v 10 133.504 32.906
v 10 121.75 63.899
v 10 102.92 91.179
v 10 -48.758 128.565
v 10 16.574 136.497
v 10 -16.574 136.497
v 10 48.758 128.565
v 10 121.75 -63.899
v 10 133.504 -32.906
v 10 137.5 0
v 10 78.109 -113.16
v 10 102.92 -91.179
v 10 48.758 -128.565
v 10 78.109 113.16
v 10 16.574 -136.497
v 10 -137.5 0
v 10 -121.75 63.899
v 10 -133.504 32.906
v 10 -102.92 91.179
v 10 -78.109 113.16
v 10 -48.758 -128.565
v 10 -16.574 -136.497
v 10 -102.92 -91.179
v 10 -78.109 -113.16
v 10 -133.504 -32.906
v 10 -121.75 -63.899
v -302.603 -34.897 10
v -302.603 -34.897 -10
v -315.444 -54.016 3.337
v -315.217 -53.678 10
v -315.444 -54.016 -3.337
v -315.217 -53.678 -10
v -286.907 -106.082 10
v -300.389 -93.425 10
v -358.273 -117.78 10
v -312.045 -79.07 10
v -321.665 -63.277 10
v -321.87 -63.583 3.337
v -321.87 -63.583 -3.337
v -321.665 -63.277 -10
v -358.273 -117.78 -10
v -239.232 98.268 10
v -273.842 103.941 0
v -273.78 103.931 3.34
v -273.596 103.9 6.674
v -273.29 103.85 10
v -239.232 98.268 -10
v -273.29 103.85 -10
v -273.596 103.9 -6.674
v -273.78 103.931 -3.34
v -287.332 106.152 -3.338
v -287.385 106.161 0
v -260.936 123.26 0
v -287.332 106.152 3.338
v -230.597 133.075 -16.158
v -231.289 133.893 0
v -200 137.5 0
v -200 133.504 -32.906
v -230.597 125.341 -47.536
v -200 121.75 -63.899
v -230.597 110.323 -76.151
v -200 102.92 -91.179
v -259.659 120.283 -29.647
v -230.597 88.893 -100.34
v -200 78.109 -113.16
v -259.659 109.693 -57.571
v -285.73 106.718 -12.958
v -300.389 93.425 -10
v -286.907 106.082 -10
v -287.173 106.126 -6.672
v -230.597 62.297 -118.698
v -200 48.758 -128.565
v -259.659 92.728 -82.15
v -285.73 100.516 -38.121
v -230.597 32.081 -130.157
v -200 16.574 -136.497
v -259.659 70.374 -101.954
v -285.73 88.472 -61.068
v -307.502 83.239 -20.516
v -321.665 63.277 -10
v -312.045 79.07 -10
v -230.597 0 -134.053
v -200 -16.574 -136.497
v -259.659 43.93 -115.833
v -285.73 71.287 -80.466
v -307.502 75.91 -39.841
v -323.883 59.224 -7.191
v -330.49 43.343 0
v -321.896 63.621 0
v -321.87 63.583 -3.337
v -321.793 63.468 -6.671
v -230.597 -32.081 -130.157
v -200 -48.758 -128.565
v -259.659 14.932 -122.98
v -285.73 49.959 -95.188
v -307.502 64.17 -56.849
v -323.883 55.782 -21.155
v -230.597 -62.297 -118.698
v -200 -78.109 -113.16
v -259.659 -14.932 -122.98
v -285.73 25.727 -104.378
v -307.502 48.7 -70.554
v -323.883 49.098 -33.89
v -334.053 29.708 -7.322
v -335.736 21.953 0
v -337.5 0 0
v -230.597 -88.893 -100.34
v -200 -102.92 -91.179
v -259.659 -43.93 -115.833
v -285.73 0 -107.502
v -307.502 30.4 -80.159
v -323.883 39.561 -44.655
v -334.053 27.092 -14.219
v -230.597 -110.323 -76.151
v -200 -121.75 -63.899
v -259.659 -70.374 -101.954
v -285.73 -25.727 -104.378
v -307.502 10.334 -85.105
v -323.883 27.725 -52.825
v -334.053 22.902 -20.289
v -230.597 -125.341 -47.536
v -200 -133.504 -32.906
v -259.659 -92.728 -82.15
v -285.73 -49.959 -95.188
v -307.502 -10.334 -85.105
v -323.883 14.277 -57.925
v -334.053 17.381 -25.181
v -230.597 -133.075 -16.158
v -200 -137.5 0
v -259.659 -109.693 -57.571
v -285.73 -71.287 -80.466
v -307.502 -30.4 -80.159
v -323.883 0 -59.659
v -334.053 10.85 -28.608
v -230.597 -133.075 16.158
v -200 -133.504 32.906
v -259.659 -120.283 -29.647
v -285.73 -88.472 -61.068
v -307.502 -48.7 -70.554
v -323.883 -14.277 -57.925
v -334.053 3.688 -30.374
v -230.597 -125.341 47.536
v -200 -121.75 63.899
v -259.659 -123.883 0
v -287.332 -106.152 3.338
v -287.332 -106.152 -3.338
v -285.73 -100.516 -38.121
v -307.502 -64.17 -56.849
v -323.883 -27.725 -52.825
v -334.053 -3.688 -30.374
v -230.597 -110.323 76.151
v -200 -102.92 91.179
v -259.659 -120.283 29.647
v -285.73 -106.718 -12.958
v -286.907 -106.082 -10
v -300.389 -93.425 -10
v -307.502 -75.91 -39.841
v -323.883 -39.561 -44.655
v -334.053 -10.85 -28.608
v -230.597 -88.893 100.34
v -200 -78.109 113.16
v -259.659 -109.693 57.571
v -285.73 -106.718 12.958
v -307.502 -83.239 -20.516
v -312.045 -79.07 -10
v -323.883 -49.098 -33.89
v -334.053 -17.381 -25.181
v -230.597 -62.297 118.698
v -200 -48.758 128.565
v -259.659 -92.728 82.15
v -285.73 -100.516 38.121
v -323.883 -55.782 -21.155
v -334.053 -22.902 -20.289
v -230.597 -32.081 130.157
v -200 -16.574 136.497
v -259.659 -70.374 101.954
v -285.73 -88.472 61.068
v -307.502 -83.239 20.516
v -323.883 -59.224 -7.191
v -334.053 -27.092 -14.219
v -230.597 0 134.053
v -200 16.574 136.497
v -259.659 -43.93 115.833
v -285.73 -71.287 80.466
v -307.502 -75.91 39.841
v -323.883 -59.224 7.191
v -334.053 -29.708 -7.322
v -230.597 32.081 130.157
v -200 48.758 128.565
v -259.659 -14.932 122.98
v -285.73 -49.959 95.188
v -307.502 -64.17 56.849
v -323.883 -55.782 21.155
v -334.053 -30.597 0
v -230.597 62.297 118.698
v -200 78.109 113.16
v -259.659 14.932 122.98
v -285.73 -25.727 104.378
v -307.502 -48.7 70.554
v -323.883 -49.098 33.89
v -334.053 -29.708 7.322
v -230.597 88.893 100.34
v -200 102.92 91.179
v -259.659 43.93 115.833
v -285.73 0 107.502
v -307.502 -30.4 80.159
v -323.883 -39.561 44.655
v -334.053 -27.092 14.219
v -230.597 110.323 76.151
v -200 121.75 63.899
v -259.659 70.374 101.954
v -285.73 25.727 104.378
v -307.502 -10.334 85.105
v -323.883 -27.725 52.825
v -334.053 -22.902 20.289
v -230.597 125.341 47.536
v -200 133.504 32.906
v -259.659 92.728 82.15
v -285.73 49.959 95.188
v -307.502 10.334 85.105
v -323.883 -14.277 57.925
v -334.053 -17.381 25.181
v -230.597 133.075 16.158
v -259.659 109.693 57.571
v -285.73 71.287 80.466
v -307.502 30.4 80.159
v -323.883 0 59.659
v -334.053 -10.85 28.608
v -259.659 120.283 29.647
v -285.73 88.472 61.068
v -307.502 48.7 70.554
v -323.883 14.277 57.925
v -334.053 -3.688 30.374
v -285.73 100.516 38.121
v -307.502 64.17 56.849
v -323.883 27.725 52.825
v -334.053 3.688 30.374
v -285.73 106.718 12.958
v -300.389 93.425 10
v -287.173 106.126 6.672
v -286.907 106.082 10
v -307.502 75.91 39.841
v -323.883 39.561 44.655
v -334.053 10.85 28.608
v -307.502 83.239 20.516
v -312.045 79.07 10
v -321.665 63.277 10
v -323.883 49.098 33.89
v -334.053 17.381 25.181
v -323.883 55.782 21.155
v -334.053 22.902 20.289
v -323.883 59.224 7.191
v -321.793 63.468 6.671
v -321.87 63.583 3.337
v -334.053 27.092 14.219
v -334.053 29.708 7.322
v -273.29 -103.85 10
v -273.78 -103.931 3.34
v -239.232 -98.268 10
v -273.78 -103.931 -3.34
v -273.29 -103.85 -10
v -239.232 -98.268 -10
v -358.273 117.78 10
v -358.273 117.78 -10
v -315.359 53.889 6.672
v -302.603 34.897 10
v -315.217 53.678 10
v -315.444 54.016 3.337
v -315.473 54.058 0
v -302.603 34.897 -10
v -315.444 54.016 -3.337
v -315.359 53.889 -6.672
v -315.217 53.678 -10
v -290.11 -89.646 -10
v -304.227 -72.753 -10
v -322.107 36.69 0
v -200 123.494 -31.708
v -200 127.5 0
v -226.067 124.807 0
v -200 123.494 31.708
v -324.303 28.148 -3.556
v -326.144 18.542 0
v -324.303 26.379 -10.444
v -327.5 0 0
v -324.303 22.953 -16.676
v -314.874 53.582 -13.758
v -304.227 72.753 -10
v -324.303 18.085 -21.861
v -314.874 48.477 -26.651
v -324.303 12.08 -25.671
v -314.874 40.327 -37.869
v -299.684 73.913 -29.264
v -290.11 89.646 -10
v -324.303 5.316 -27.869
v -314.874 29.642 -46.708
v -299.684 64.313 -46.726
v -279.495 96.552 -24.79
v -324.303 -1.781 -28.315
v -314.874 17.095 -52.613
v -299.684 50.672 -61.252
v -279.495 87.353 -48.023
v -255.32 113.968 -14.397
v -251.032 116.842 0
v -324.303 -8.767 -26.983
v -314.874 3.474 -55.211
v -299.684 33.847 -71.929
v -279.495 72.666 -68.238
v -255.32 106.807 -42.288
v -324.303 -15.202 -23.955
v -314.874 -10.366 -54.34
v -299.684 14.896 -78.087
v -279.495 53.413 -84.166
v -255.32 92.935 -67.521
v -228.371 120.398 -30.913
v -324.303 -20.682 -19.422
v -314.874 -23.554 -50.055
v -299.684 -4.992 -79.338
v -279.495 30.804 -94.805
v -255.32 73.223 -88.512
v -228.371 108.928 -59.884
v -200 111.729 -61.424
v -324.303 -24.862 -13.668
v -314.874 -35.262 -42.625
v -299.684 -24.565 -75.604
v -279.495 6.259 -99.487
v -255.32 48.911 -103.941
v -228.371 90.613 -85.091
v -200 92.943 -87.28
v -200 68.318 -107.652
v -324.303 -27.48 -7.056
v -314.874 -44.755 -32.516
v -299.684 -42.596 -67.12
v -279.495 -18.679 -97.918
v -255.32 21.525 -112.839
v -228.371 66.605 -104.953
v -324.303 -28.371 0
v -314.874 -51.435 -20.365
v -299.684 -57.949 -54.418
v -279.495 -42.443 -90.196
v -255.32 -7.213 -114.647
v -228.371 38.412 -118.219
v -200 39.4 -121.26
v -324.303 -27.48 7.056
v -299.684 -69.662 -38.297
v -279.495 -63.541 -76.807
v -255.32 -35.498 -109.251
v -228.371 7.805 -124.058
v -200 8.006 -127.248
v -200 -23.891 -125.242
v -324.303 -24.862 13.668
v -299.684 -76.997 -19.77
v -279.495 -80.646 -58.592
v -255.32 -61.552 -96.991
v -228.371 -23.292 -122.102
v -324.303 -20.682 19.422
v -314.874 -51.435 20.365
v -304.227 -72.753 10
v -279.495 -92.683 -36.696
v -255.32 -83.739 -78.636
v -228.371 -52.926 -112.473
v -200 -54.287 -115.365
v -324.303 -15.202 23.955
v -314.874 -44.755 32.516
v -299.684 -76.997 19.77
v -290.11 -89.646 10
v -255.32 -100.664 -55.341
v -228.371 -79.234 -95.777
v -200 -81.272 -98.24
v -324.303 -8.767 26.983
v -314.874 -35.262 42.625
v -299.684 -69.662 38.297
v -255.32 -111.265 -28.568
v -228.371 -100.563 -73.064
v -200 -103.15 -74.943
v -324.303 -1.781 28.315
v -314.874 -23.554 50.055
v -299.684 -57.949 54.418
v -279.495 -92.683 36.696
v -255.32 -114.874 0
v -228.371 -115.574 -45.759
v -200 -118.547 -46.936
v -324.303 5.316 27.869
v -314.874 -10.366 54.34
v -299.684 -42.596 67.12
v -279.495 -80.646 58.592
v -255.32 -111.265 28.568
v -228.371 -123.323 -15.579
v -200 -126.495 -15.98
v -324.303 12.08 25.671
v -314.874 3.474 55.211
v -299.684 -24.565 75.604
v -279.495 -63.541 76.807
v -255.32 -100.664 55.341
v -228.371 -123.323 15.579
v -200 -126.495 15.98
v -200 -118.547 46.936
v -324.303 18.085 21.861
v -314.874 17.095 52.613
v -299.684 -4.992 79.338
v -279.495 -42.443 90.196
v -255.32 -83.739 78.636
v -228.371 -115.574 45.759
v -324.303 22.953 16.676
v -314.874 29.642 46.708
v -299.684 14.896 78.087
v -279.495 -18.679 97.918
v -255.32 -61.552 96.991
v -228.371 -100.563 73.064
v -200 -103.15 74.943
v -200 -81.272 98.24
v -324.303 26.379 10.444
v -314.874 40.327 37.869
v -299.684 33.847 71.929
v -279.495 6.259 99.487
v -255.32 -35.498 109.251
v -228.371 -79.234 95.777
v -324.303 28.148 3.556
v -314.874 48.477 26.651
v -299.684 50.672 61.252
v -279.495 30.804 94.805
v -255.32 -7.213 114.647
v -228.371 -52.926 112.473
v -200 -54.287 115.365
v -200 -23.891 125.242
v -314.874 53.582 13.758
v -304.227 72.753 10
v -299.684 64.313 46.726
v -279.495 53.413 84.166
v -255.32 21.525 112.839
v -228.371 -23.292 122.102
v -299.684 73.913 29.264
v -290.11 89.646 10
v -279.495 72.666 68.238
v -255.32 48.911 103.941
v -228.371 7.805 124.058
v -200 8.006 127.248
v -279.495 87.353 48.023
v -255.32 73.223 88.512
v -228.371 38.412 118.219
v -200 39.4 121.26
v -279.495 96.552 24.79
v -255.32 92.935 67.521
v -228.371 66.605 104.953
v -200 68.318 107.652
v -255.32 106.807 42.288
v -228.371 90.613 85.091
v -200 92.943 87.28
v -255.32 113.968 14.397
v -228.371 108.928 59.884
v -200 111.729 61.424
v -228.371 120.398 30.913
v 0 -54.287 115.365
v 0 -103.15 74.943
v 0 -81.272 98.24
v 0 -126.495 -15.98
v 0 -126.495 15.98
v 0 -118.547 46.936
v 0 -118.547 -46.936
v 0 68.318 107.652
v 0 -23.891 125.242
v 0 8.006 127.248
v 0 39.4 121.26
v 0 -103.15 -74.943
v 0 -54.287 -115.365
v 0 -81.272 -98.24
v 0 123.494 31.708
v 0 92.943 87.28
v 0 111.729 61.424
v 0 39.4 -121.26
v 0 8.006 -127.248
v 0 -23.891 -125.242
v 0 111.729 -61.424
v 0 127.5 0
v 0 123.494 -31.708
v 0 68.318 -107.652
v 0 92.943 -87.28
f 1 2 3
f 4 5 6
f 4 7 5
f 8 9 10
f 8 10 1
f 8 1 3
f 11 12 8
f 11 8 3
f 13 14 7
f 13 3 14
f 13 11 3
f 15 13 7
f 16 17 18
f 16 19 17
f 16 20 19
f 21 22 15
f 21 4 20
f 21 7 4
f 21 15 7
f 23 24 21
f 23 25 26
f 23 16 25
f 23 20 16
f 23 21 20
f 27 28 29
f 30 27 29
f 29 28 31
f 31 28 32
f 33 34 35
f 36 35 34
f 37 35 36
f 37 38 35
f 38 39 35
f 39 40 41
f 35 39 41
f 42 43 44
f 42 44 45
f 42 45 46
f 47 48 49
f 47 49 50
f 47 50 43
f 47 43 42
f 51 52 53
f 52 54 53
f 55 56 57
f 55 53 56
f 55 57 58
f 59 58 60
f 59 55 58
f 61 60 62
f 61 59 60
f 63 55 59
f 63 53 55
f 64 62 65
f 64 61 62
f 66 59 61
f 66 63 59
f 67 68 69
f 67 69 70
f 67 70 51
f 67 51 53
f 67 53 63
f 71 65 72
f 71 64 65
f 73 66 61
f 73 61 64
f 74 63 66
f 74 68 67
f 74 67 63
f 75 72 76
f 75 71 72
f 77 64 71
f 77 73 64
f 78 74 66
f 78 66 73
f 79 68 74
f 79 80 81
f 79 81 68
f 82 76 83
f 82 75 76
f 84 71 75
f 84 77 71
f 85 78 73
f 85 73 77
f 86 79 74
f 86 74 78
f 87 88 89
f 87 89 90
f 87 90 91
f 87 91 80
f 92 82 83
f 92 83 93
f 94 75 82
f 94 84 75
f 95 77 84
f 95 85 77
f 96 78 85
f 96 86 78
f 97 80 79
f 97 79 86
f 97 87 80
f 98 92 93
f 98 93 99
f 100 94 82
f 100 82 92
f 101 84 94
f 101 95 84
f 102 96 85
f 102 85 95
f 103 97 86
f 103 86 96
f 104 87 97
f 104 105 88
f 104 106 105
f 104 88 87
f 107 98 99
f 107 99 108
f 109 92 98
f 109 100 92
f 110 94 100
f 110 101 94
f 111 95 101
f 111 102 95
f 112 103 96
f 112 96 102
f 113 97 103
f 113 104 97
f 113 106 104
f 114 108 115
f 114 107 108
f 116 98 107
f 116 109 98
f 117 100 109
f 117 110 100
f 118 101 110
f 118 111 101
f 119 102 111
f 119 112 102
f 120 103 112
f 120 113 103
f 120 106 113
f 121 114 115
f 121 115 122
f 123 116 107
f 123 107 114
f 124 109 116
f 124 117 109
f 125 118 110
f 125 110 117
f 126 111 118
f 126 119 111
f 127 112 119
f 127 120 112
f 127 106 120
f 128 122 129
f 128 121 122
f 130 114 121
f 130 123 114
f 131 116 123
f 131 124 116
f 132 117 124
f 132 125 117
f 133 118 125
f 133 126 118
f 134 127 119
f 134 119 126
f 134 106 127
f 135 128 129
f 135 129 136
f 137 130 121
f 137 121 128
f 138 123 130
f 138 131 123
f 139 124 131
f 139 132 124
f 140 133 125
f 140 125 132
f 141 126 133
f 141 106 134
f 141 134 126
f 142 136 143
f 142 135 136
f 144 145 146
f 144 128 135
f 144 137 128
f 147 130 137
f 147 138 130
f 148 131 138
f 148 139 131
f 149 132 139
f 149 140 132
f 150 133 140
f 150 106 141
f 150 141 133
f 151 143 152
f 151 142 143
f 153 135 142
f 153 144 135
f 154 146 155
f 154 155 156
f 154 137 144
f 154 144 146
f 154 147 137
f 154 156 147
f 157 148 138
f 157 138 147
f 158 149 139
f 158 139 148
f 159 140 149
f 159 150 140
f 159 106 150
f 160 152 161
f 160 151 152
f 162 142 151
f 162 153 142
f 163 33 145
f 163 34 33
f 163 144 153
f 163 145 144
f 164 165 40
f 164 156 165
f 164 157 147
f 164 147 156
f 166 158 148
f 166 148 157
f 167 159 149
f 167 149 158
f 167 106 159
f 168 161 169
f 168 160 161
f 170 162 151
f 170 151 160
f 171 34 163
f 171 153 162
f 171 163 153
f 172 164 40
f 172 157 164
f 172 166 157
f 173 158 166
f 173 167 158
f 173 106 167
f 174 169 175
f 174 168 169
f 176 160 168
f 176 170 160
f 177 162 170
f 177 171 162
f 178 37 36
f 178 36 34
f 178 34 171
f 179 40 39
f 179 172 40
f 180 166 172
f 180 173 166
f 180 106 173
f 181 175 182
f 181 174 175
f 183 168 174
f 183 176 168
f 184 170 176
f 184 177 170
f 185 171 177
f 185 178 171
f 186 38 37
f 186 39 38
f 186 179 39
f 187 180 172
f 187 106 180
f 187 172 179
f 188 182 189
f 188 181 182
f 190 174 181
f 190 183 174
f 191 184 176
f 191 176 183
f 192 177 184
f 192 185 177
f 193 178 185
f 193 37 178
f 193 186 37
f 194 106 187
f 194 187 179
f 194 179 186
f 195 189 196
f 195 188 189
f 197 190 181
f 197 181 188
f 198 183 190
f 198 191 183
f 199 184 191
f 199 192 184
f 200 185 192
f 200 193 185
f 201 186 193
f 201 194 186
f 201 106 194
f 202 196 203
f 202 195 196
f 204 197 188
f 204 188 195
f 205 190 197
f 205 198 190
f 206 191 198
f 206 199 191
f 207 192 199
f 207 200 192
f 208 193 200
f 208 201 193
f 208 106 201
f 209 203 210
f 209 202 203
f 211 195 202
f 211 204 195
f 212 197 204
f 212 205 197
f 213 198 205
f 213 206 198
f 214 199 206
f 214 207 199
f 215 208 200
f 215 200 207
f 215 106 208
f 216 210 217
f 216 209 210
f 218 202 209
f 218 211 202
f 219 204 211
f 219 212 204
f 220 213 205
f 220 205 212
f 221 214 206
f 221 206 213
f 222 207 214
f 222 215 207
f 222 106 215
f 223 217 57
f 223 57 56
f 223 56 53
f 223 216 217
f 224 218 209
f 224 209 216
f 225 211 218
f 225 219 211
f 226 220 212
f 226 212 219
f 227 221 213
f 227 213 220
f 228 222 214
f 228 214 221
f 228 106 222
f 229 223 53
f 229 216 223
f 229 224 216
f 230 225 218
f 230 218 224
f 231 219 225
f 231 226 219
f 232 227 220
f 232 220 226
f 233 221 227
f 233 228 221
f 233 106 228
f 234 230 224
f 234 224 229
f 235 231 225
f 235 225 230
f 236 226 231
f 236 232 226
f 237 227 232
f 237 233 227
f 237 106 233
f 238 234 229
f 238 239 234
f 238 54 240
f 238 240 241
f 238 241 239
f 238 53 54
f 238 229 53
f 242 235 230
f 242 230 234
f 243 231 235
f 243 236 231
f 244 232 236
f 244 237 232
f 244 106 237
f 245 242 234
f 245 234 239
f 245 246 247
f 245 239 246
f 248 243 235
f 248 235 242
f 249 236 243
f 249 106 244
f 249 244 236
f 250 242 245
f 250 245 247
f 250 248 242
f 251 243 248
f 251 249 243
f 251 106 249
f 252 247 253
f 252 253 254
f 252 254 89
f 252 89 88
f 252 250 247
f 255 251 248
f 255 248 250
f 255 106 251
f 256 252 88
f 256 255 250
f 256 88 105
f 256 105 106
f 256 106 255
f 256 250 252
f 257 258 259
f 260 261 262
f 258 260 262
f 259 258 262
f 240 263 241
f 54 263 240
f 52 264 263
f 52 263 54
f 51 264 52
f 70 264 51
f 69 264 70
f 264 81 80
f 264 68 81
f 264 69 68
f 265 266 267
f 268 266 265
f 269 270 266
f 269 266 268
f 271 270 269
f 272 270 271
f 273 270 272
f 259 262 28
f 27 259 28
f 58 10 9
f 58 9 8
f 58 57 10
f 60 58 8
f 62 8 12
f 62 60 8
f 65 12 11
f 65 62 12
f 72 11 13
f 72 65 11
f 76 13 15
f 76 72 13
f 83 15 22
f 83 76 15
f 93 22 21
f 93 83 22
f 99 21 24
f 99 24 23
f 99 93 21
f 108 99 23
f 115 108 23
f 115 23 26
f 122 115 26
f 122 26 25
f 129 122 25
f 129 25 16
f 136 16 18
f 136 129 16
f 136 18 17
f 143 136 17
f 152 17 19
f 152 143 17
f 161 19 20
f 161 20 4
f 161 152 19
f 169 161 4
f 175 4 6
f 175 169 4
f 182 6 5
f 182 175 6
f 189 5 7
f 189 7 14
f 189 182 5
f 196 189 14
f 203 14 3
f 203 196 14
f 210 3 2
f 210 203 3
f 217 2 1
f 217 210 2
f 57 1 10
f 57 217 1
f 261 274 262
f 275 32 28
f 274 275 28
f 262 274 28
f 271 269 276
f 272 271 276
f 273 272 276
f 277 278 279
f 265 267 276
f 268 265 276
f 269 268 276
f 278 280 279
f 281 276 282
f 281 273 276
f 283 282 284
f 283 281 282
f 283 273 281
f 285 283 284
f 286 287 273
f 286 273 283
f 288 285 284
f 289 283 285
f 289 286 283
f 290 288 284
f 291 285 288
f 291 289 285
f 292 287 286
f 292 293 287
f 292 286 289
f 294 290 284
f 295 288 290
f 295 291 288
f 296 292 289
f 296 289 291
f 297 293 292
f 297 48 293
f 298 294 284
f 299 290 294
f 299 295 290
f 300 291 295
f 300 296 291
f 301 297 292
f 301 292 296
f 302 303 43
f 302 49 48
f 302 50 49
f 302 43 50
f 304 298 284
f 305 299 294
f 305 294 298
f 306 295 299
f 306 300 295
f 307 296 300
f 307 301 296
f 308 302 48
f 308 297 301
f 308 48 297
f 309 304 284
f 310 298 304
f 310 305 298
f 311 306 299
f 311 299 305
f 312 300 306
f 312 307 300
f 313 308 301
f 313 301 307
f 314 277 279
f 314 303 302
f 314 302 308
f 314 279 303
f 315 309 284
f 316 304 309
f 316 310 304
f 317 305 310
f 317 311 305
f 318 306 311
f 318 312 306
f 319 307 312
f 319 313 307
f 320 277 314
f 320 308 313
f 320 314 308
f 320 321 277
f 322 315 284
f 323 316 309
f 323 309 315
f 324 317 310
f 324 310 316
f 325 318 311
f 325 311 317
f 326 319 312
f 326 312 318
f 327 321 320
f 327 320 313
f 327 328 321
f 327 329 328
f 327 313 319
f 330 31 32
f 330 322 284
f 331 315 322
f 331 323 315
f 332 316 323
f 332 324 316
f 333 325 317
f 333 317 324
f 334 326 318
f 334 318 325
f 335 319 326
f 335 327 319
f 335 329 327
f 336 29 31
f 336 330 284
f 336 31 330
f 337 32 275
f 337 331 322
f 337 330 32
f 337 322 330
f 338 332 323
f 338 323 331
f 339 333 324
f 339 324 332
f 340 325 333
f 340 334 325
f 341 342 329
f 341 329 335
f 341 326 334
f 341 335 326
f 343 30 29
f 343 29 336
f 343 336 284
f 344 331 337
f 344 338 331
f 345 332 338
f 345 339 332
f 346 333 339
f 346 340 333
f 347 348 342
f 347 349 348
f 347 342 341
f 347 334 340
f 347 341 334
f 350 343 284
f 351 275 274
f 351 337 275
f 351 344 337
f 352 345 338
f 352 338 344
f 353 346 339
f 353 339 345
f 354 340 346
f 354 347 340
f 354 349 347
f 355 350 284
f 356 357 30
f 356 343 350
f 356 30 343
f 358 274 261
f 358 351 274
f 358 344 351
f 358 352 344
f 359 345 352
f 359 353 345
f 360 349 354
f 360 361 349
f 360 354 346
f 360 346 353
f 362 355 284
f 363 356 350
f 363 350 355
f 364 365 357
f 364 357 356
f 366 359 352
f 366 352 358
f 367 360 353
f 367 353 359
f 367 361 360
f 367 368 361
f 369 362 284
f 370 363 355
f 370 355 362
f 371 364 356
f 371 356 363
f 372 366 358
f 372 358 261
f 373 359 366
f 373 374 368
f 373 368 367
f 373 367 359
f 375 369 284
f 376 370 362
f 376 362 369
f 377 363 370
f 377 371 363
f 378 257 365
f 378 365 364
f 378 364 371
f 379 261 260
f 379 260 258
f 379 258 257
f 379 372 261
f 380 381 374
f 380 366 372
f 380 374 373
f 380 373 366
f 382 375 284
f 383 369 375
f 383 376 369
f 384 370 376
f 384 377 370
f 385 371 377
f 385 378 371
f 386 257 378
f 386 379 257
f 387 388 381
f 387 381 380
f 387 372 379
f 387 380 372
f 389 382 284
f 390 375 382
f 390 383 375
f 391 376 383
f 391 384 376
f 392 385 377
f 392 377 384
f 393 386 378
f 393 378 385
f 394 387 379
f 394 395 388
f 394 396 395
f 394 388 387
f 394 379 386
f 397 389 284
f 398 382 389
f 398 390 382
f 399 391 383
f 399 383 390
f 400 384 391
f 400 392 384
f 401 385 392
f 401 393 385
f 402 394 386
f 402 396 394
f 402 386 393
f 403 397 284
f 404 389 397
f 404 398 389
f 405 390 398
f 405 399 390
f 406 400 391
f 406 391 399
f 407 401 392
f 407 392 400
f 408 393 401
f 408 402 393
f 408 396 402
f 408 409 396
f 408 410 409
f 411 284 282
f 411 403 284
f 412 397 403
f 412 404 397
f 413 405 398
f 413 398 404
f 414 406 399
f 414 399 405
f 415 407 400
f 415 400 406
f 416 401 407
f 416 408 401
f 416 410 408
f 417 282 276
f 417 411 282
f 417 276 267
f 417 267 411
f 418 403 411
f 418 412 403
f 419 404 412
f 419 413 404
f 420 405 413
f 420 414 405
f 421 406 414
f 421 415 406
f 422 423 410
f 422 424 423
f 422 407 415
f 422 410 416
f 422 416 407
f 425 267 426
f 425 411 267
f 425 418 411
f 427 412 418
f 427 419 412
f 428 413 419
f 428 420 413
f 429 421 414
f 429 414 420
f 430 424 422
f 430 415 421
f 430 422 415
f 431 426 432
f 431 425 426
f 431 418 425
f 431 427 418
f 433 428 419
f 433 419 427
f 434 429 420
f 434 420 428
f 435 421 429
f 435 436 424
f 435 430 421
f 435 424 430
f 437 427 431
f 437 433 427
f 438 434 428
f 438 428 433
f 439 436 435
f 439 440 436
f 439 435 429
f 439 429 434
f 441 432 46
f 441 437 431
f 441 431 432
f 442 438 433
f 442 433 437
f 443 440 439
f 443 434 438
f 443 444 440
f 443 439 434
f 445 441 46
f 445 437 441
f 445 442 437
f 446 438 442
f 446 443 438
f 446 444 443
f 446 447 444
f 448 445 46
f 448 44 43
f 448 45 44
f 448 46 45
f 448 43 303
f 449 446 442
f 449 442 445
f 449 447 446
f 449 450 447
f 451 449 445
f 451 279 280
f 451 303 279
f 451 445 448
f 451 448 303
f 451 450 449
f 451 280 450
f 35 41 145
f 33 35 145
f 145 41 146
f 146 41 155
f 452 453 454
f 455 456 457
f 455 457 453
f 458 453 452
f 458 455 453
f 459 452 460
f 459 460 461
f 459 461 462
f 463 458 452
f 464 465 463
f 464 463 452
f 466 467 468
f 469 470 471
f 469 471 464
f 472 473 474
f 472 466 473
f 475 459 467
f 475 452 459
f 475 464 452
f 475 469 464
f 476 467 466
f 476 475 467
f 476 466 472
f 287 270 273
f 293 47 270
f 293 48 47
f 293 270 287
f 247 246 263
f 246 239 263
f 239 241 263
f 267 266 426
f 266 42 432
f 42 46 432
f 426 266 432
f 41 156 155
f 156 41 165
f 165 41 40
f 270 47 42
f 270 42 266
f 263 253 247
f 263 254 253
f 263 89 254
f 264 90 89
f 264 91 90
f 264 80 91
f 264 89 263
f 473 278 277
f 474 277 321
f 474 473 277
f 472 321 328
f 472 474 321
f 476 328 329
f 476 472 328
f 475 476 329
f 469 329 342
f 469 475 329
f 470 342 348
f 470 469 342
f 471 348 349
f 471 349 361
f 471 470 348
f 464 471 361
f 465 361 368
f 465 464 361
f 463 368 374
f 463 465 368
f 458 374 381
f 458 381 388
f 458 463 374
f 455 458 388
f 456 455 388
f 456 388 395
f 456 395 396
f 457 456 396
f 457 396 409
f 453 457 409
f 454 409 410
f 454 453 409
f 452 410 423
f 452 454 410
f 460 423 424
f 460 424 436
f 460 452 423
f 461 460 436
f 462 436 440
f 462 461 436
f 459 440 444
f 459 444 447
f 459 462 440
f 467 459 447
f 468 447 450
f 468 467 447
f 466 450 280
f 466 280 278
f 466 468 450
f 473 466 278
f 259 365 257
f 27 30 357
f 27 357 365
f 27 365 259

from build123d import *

# Parameters (mm, degrees)
EXTRUDE_1_DEPTH      = 10
EXTRUDE_1_DEPTH_BACK = 10


with BuildPart() as part:
    # ｽｹｯﾁ2 → 回転-薄板1 (revolve)
    with BuildSketch(Plane.XY):
        with BuildLine():
            ThreePointArc((-327.5, 0), (-290.156114601, 90.156114601), (-200, 127.5))
            Line((-200, 127.5), (0, 127.5))
            Line((0, 127.5), (0, 0))
            Line((0, 0), (10, 0))
            Line((10, 0), (10, 137.5))
            Line((10, 137.5), (-200, 137.5))
            ThreePointArc((-200, 137.5), (-297.227182413, 97.227182413), (-337.5, 0))
            Line((-337.5, 0), (-327.5, 0))
        make_face()
    revolve(axis=Axis((0, 0, 0), (-1, 0, 0)))

    # ｽｹｯﾁ3 → ﾎﾞｽ - 押し出し1 (add, two sides: drawn at the far end of the back side and taken through both)
    with BuildSketch(Plane.XY.offset(-EXTRUDE_1_DEPTH_BACK)):
        Polygon((-302.60266968, 34.89733032), (-358.272990838, 117.779688618), (-239.232172231, 98.267827769), align=None)
        Polygon((-358.272990838, -117.779688618), (-239.232172231, -98.267827769), (-302.60266968, -34.89733032), align=None)
    extrude(amount=EXTRUDE_1_DEPTH + EXTRUDE_1_DEPTH_BACK)


solid = part.part
